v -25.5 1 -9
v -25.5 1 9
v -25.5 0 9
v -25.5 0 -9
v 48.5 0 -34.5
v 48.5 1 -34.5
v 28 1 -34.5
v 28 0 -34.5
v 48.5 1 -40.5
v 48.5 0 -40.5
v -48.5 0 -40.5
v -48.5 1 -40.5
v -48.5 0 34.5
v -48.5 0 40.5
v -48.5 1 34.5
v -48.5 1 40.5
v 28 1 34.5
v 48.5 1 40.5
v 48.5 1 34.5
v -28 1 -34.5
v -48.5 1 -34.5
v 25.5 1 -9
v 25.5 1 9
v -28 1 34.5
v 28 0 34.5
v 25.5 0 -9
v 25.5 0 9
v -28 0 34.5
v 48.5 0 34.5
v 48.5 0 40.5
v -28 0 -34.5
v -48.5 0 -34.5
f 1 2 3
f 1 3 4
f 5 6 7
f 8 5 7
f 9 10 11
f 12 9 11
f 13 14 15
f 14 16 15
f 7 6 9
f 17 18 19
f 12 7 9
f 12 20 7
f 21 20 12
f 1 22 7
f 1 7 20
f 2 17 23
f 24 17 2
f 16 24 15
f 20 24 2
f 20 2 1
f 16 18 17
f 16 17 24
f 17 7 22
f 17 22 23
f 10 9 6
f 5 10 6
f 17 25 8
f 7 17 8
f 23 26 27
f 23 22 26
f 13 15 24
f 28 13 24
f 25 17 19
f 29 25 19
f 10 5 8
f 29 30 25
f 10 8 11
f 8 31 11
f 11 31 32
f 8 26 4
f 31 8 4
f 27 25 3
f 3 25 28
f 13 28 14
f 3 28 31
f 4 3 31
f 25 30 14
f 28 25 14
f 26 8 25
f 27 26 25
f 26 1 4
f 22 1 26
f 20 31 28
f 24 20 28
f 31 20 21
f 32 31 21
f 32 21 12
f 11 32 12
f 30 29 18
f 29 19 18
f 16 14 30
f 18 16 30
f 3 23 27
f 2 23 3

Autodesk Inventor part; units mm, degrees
ref_plane "YZ Plane" through (0, 0, 0) normal (1, 0, 0) x (0, 1, 0)
ref_plane "XZ Plane" through (0, 0, 0) normal (0, 1, 0) x (-1, 0, 0)
ref_plane "XY Plane" through (0, 0, 0) normal (0, 0, 1) x (1, 0, 0)
sketch "Szkic1" plane through (0, 0, 0) normal (0, 1, 0) x (-1, 0, 0)
  line L0 (-28, -40.5) -> (28, -40.5)
  line L1 (28, -40.5) -> (28, 40.5)
  line L2 (28, 40.5) -> (-28, 40.5)
  line L3 (-28, 40.5) -> (-28, -40.5)
  point P0 (0, 0)
  dimension "d0" = 81
  dimension "d1" = 56
  dimension "d2" = 28
  dimension "d3" = 40.5
extrude "Wyciągnięcie proste1" add sketch "Szkic1" along normal blind 1
sketch "Szkic2" plane through (0, 1, 0) normal (0, 1, 0) x (1, 0, 0)
  line L0 (-25.5, 9) -> (25.5, 9)
  line L1 (25.5, 9) -> (25.5, -9)
  line L2 (25.5, -9) -> (-25.5, -9)
  line L3 (-25.5, -9) -> (-25.5, 9)
  point P0 (0, 0)
  dimension "d6" = 18
  dimension "d7" = 9
  dimension "d8" = 51
  dimension "d9" = 25.5
extrude "Wyciągnięcie proste2" cut sketch "Szkic2" against normal blind 1
sketch "Szkic3" plane through (0, 1, 0) normal (0, 1, 0) x (1, 0, 0)
  line L0 (-48.5, -34.5) -> (48.5, -34.5)
  line L1 (48.5, -34.5) -> (48.5, -40.5)
  line L2 (48.5, -40.5) -> (-48.5, -40.5)
  line L3 (-48.5, -40.5) -> (-48.5, -34.5)
  line L4 (-28, -40.5) -> (28, -40.5) projected
  line L5 (25.5, -9) -> (-25.5, -9) projected
  line L6 (-48.5, 40.5) -> (48.5, 40.5)
  line L7 (48.5, 40.5) -> (48.5, 34.5)
  line L8 (48.5, 34.5) -> (-48.5, 34.5)
  line L9 (-48.5, 34.5) -> (-48.5, 40.5)
  line L10 (28, 40.5) -> (-28, 40.5) projected
  point P0 (0, 0)
  point P1 (28, -9.365)
  point P2 (-28, -9.365)
  point P3 (-25.5, -9)
  dimension "d12" = 97
  dimension "d13" = 6
  dimension "d15" = 48.5
  dimension "d17" = 0
  dimension "d20" = 6
  dimension "d21" = 0
  dimension "d22" = 97
  dimension "d23" = 0
extrude "Wyciągnięcie proste4" add sketch "Szkic3" against normal blind 1
properties part number "pcb_bottom"
